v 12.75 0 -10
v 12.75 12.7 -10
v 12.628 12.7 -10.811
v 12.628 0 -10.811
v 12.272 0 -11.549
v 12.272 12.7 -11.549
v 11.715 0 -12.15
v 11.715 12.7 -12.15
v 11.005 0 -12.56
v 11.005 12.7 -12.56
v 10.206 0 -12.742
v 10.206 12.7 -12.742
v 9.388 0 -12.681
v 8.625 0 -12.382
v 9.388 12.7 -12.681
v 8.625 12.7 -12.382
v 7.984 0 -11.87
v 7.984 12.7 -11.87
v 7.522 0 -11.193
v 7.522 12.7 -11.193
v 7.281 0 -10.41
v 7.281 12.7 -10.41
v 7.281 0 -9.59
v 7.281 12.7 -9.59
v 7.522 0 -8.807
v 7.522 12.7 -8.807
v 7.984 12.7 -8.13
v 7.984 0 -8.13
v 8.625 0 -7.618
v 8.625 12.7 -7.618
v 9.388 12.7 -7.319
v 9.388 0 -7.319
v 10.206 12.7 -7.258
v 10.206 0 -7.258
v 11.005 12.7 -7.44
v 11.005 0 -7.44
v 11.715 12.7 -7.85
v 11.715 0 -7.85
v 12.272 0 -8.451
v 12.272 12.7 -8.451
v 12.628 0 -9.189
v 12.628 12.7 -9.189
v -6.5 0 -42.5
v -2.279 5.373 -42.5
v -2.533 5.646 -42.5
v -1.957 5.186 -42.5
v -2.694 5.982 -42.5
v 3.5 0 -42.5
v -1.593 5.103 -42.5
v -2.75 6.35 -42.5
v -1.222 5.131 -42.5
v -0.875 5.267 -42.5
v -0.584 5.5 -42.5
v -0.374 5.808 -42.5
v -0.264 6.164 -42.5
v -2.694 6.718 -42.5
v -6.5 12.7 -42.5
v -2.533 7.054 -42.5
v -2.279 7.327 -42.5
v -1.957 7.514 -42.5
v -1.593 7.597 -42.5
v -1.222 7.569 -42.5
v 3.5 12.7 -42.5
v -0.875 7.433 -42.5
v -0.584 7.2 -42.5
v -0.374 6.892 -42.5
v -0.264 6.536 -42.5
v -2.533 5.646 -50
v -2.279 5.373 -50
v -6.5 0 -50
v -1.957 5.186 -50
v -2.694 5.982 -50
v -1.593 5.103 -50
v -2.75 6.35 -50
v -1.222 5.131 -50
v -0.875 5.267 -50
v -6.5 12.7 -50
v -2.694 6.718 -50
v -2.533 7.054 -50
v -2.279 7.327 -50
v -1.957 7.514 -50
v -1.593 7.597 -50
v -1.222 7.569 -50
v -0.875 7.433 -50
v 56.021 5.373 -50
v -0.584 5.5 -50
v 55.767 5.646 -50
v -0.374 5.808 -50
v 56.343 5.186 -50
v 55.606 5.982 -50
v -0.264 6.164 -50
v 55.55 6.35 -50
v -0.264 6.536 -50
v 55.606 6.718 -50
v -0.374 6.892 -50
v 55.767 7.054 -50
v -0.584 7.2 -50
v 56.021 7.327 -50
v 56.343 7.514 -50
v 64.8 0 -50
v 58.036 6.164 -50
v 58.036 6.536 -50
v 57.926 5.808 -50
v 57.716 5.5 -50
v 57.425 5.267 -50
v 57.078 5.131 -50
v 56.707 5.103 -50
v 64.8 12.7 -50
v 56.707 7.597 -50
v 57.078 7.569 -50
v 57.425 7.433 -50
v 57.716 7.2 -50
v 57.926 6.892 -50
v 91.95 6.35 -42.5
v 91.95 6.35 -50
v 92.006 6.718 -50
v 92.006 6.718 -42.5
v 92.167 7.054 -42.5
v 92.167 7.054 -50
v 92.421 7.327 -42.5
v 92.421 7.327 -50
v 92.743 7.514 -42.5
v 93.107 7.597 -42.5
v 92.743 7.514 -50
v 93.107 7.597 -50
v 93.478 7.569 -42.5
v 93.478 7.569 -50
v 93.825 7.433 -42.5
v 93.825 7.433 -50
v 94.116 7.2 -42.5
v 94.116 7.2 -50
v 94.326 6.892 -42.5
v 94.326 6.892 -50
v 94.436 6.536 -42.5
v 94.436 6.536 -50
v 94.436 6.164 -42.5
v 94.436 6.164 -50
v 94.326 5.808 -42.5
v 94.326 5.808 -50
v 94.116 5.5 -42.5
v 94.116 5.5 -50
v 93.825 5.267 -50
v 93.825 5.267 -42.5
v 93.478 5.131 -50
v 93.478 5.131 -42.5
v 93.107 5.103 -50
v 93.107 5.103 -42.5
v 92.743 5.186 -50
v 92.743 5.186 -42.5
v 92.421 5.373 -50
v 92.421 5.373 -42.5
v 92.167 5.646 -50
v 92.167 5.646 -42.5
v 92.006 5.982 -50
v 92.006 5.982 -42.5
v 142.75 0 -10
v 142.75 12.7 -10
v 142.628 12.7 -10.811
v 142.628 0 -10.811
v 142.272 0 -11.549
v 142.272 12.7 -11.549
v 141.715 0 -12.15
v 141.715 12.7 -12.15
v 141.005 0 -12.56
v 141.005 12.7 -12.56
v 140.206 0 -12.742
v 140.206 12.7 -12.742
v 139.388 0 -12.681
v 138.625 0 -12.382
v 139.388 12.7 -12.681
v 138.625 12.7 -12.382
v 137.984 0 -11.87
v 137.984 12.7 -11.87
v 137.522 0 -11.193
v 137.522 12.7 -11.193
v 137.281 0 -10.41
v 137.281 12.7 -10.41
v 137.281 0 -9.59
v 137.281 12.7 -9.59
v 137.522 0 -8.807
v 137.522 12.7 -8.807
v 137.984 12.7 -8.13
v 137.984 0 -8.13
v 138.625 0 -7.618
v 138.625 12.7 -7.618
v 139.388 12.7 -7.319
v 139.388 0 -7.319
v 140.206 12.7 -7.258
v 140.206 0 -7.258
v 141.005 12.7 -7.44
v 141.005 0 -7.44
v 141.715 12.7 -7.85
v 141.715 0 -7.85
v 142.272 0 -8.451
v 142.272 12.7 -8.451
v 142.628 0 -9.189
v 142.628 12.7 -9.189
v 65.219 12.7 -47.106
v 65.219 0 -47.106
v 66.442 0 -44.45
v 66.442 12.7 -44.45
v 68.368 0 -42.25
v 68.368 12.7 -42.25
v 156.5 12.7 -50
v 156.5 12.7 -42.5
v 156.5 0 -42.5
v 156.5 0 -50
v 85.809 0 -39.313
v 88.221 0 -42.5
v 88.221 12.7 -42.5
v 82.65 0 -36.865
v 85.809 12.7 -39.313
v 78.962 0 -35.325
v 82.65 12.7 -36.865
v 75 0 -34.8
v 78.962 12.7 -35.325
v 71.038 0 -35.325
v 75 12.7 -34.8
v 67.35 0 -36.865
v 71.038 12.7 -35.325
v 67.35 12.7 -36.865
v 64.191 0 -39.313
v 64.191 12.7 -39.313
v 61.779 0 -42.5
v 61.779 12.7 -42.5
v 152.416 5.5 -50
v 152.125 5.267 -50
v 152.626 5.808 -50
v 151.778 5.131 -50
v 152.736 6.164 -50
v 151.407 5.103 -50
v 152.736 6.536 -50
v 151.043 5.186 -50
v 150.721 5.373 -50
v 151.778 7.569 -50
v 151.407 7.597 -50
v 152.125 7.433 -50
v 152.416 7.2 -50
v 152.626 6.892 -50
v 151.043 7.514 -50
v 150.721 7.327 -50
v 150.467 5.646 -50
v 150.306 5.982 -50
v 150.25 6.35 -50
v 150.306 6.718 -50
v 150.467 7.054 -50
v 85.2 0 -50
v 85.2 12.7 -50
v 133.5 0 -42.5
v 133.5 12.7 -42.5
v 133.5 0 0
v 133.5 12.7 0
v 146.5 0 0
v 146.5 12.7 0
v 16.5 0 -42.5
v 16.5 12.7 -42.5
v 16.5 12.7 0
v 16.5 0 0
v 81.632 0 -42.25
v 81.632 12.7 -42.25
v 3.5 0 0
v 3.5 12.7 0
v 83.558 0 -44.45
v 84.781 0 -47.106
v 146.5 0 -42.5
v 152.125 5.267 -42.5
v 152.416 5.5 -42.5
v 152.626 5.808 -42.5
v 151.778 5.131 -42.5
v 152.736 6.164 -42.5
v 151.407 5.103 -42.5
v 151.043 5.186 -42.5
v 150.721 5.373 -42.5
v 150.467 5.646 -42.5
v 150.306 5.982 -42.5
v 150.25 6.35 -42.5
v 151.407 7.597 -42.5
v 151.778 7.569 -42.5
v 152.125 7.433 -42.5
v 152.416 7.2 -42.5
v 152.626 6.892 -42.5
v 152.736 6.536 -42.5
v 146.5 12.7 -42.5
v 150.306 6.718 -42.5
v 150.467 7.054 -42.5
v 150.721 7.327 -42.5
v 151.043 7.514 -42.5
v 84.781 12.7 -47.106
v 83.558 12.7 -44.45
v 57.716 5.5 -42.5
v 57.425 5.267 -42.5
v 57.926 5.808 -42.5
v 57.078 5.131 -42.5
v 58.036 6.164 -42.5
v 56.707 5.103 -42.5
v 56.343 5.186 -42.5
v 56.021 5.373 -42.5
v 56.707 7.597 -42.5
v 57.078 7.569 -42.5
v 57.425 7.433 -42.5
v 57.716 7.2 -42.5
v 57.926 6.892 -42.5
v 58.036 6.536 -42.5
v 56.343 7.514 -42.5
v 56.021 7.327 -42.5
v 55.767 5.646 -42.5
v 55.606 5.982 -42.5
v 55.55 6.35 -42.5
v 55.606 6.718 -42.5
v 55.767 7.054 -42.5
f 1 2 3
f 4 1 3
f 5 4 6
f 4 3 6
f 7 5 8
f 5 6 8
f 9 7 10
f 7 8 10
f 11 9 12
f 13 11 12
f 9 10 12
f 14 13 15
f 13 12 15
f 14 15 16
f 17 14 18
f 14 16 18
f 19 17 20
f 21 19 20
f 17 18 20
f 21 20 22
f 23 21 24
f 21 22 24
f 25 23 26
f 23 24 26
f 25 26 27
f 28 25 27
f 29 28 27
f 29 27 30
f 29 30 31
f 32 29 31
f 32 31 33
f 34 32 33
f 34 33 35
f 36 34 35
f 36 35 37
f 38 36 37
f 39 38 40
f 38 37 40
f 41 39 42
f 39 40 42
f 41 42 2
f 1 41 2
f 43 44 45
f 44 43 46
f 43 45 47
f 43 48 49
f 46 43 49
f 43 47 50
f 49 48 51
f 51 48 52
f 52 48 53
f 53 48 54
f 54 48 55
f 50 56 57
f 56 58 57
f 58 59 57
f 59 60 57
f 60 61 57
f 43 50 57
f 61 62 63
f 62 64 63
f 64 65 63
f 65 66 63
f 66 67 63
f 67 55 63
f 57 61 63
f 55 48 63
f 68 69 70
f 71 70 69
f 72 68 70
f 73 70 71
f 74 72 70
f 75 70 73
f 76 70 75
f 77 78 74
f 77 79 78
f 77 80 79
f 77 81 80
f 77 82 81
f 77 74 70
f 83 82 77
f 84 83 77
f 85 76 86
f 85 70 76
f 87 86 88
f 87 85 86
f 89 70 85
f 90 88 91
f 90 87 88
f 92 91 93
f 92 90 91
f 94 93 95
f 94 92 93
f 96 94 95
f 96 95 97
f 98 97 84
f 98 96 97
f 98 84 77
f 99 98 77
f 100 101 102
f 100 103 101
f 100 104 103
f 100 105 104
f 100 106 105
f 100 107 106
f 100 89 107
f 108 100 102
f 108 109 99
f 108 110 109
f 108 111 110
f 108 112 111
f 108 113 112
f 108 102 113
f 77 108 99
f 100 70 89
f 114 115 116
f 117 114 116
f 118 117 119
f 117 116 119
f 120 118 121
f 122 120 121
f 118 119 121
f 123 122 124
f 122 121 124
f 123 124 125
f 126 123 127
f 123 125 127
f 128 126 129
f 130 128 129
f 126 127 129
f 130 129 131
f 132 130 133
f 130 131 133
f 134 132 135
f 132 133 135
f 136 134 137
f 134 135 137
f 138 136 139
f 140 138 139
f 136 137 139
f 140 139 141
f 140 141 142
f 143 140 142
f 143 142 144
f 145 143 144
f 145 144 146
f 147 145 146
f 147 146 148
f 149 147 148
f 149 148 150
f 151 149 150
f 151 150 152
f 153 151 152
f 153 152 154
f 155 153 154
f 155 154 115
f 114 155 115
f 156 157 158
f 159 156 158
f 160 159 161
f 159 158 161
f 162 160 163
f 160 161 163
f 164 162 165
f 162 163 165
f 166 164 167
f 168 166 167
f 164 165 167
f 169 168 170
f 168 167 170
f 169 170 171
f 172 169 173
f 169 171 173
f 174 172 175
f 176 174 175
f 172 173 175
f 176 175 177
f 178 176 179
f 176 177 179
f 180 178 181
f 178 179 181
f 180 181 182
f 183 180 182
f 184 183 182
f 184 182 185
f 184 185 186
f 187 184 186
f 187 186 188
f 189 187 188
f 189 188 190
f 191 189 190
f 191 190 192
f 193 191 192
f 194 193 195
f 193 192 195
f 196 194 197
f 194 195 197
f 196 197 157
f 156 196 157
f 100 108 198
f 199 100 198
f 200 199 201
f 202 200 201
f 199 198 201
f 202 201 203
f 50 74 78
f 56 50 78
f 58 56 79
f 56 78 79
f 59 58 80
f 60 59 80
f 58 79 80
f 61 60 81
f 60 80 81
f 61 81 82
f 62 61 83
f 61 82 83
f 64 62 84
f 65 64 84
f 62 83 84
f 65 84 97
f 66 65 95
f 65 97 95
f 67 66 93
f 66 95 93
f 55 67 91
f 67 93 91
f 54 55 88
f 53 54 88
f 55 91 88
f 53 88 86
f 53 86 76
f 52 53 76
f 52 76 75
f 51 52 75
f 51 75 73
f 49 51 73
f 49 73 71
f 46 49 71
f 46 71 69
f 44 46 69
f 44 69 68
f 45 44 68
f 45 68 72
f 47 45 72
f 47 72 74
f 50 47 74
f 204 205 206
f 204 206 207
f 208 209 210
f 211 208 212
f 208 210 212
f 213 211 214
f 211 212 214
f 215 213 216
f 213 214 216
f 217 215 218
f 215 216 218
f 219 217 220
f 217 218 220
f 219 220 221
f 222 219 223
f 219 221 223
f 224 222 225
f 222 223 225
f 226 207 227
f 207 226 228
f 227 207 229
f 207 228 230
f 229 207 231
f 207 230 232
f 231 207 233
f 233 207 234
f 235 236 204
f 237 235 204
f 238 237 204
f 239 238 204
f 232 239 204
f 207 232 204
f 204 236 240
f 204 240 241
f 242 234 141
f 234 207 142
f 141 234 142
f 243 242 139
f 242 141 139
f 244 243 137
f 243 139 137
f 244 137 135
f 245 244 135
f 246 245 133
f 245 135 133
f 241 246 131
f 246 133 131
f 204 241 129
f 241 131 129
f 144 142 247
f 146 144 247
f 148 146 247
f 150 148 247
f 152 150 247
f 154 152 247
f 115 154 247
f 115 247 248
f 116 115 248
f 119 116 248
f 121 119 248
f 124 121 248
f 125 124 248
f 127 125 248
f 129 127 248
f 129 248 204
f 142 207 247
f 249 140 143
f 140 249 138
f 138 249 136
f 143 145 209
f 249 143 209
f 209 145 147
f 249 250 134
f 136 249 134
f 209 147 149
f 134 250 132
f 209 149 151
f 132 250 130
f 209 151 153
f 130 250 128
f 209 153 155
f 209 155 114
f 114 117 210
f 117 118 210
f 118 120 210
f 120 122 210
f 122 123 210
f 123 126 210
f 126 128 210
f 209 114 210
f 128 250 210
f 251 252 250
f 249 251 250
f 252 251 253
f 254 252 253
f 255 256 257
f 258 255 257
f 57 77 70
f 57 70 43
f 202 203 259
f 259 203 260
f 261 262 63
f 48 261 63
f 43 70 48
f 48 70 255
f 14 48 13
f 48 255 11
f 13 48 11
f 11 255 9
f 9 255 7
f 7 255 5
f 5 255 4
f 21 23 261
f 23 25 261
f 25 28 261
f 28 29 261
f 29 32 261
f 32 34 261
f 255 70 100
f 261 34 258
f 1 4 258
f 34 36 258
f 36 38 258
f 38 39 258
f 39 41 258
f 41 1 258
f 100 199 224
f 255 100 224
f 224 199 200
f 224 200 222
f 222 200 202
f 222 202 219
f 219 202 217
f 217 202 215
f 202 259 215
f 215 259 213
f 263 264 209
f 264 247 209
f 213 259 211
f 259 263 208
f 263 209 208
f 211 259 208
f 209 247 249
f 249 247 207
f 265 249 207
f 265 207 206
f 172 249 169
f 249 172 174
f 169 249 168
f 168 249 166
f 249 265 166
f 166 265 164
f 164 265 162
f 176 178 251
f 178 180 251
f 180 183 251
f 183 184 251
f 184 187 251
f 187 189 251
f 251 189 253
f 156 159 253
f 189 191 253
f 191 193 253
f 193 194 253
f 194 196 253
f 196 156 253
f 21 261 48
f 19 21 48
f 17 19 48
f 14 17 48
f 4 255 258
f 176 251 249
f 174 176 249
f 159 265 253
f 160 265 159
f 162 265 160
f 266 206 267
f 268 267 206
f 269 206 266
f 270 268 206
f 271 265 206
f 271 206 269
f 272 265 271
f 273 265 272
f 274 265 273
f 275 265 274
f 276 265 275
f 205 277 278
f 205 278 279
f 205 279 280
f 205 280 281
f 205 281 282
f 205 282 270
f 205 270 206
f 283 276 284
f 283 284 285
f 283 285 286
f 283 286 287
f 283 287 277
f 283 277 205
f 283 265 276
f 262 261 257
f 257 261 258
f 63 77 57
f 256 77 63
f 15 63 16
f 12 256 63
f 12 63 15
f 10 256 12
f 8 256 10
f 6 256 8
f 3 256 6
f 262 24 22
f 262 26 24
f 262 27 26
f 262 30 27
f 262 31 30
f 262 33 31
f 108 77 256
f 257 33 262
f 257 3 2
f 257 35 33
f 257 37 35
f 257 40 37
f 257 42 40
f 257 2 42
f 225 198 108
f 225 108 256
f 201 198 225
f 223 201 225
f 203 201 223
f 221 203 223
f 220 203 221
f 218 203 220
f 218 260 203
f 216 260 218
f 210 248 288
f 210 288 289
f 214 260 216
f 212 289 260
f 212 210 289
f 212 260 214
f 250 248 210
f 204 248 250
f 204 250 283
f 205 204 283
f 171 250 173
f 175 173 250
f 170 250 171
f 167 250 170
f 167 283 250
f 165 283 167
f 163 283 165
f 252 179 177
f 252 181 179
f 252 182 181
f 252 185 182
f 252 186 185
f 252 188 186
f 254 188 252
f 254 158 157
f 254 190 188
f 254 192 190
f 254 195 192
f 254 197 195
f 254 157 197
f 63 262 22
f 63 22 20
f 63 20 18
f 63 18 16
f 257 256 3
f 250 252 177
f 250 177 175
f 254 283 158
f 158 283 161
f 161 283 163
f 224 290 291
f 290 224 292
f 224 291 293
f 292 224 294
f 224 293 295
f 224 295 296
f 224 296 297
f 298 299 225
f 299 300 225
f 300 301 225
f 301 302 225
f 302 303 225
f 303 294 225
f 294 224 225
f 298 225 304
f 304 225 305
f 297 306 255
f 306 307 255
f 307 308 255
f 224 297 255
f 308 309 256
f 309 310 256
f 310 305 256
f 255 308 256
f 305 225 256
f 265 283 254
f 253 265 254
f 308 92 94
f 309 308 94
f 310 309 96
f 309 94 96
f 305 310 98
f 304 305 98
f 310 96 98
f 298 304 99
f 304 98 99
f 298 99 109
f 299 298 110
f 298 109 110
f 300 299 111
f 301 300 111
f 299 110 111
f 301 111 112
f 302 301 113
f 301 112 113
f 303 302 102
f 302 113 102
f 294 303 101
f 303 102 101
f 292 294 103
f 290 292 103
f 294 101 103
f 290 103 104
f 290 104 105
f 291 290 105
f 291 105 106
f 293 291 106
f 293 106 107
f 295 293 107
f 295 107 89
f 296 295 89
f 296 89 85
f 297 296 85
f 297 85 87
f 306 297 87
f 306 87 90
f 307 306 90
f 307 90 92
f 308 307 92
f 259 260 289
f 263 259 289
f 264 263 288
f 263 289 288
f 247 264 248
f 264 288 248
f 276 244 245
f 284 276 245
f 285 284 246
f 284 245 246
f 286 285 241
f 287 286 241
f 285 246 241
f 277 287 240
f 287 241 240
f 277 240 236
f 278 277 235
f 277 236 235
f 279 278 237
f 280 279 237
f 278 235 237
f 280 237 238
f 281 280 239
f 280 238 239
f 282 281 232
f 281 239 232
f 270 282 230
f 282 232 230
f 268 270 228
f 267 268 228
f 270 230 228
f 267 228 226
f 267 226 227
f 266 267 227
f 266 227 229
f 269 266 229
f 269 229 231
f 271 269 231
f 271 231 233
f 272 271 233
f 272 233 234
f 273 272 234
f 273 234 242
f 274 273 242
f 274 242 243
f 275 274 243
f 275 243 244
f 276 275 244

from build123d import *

# Parameters (mm, degrees)
SKETCH1_W           = 150
SKETCH1_H           = 100
BOSS_EXTRUDE1_DEPTH = 12.7
SKETCH2_W           = 13.263106726
SKETCH2_H           = 7.75
SKETCH2_R           = 2.75
CUT_EXTRUDE1_DEPTH  = 12.7
SKETCH3_R           = 2.75
CUT_EXTRUDE2_DEPTH  = 30
SKETCH5_W           = 7.5
SKETCH5_H           = 12.7
BOSS_EXTRUDE2_DEPTH = 10
SKETCH6_W           = 7.5
SKETCH6_H           = 12.7
BOSS_EXTRUDE3_DEPTH = 10
SKETCH4_R           = 1.25
CUT_EXTRUDE3_DEPTH  = 40


with BuildPart() as part:
    # Sketch1 → Boss-Extrude1 (new body)
    with BuildSketch(Plane(origin=(0, 0, 0), x_dir=(1, 0, 0), z_dir=(0, 1, 0))):
        with Locations((75, 50)):
            Rectangle(SKETCH1_W, SKETCH1_H)
    extrude(amount=BOSS_EXTRUDE1_DEPTH)

    # Sketch2 → Cut-Extrude1 (cut)
    with BuildSketch(Plane(origin=(0, 12.7, 0), x_dir=(1, 0, 0), z_dir=(0, 1, 0))):
        with BuildLine():
            ThreePointArc((81.631553363, 42.25), (84.265037623, 45.733962277), (85.2, 50))
            Line((85.2, 50), (81.631553363, 50))
            Line((81.631553363, 50), (81.631553363, 42.25))
        make_face()
        with BuildLine():
            Line((81.631553363, 50), (85.2, 50))
            ThreePointArc((85.2, 50), (84.265037623, 54.266037723), (81.631553363, 57.75))
            Line((81.631553363, 57.75), (81.631553363, 50))
        make_face()
        with BuildLine():
            Line((68.368446637, 42.25), (68.368446637, 50))
            Line((68.368446637, 50), (64.8, 50))
            ThreePointArc((64.8, 50), (65.734962377, 45.733962277), (68.368446637, 42.25))
        make_face()
        with BuildLine():
            Line((64.8, 50), (68.368446637, 50))
            Line((68.368446637, 50), (68.368446637, 57.75))
            ThreePointArc((68.368446637, 57.75), (65.734962377, 54.266037723), (64.8, 50))
        make_face()
        with Locations((75, 53.875)):
            Rectangle(SKETCH2_W, SKETCH2_H)
        with Locations((75, 46.125)):
            Rectangle(SKETCH2_W, SKETCH2_H)
        with Locations((10, 90)):
            Circle(SKETCH2_R)
        with Locations((140, 90)):
            Circle(SKETCH2_R)
        with Locations((140, 10)):
            Circle(SKETCH2_R)
        with Locations((10, 10)):
            Circle(SKETCH2_R)
    extrude(amount=-CUT_EXTRUDE1_DEPTH, mode=Mode.SUBTRACT)

    # Sketch3 → Cut-Extrude2 (cut)
    with BuildSketch(Plane(origin=(0, 12.7, 0), x_dir=(1, 0, 0), z_dir=(0, 1, 0))):
        with BuildLine():
            Line((133.5, 50), (146.5, 50))
            Line((146.5, 50), (146.5, 42.5))
            Line((146.5, 42.5), (146.5, 0))
            Line((146.5, 0), (150, 0))
            Line((150, 0), (150, 100))
            Line((150, 100), (0, 100))
            Line((0, 100), (0, 0))
            Line((0, 0), (3.5, 0))
            Line((3.5, 0), (3.5, 42.5))
            Line((3.5, 42.5), (3.5, 50))
            Line((3.5, 50), (16.5, 50))
            Line((16.5, 50), (59.8, 50))
            ThreePointArc((59.8, 50), (75, 65.2), (90.2, 50))
            Line((90.2, 50), (133.5, 50))
        make_face()
        with Locations((10, 90)):
            Circle(SKETCH3_R, mode=Mode.SUBTRACT)
        with Locations((140, 90)):
            Circle(SKETCH3_R, mode=Mode.SUBTRACT)
        with BuildLine():
            Line((85.2, 50), (90.2, 50))
            ThreePointArc((90.2, 50), (75, 65.2), (59.8, 50))
            Line((59.8, 50), (64.8, 50))
            ThreePointArc((64.8, 50), (65.734962377, 54.266037723), (68.368446637, 57.75))
            ThreePointArc((68.368446637, 57.75), (75, 60.2), (81.631553363, 57.75))
            ThreePointArc((81.631553363, 57.75), (84.265037623, 54.266037723), (85.2, 50))
        make_face()
        with BuildLine():
            Line((75, 50), (85.2, 50))
            ThreePointArc((85.2, 50), (84.265037623, 54.266037723), (81.631553363, 57.75))
            Line((81.631553363, 57.75), (68.368446637, 57.75))
            ThreePointArc((68.368446637, 57.75), (65.734962377, 54.266037723), (64.8, 50))
            Line((64.8, 50), (75, 50))
        make_face()
        with BuildLine():
            Line((133.5, 0), (133.5, 42.5))
            Line((133.5, 42.5), (88.220816919, 42.5))
            ThreePointArc((88.220816919, 42.5), (75, 34.8), (61.779183081, 42.5))
            Line((61.779183081, 42.5), (16.5, 42.5))
            Line((16.5, 42.5), (16.5, 0))
            Line((16.5, 0), (133.5, 0))
        make_face()
        with BuildLine():
            Line((75, 42.5), (75, 50))
            Line((75, 50), (64.8, 50))
            ThreePointArc((64.8, 50), (65.657812944, 45.90566965), (68.086968827, 42.5))
            Line((68.086968827, 42.5), (75, 42.5))
        make_face()
        with BuildLine():
            ThreePointArc((81.913031173, 42.5), (84.342187056, 45.90566965), (85.2, 50))
            Line((85.2, 50), (75, 50))
            Line((75, 50), (75, 42.5))
            Line((75, 42.5), (81.913031173, 42.5))
        make_face()
        with BuildLine():
            Line((68.368446637, 57.75), (81.631553363, 57.75))
            ThreePointArc((81.631553363, 57.75), (75, 60.2), (68.368446637, 57.75))
        make_face()
    extrude(amount=-CUT_EXTRUDE2_DEPTH, mode=Mode.SUBTRACT)

    # Sketch5 → Boss-Extrude2 (add)
    with BuildSketch(Plane(origin=(146.5, 0, 0), x_dir=(0, 0, -1), z_dir=(1, 0, 0))):
        with Locations((46.25, 6.35)):
            Rectangle(SKETCH5_W, SKETCH5_H)
    extrude(amount=BOSS_EXTRUDE2_DEPTH)

    # Sketch6 → Boss-Extrude3 (add)
    with BuildSketch(Plane.ZY.offset(-3.5)):
        with Locations((-46.25, 6.35)):
            Rectangle(SKETCH6_W, SKETCH6_H)
    extrude(amount=BOSS_EXTRUDE3_DEPTH)

    # Sketch4 → Cut-Extrude3 (cut)
    with BuildSketch(Plane(origin=(0, 0, -50), x_dir=(-1, 0, 0), z_dir=(0, 0, -1))):
        with Locations((-151.5, 6.35)):
            Circle(SKETCH4_R)
        with Locations((-93.2, 6.35)):
            Circle(SKETCH4_R)
        with Locations((-56.8, 6.35)):
            Circle(SKETCH4_R)
        with Locations((1.5, 6.35)):
            Circle(SKETCH4_R)
    extrude(amount=-CUT_EXTRUDE3_DEPTH, mode=Mode.SUBTRACT)


solid = part.part
